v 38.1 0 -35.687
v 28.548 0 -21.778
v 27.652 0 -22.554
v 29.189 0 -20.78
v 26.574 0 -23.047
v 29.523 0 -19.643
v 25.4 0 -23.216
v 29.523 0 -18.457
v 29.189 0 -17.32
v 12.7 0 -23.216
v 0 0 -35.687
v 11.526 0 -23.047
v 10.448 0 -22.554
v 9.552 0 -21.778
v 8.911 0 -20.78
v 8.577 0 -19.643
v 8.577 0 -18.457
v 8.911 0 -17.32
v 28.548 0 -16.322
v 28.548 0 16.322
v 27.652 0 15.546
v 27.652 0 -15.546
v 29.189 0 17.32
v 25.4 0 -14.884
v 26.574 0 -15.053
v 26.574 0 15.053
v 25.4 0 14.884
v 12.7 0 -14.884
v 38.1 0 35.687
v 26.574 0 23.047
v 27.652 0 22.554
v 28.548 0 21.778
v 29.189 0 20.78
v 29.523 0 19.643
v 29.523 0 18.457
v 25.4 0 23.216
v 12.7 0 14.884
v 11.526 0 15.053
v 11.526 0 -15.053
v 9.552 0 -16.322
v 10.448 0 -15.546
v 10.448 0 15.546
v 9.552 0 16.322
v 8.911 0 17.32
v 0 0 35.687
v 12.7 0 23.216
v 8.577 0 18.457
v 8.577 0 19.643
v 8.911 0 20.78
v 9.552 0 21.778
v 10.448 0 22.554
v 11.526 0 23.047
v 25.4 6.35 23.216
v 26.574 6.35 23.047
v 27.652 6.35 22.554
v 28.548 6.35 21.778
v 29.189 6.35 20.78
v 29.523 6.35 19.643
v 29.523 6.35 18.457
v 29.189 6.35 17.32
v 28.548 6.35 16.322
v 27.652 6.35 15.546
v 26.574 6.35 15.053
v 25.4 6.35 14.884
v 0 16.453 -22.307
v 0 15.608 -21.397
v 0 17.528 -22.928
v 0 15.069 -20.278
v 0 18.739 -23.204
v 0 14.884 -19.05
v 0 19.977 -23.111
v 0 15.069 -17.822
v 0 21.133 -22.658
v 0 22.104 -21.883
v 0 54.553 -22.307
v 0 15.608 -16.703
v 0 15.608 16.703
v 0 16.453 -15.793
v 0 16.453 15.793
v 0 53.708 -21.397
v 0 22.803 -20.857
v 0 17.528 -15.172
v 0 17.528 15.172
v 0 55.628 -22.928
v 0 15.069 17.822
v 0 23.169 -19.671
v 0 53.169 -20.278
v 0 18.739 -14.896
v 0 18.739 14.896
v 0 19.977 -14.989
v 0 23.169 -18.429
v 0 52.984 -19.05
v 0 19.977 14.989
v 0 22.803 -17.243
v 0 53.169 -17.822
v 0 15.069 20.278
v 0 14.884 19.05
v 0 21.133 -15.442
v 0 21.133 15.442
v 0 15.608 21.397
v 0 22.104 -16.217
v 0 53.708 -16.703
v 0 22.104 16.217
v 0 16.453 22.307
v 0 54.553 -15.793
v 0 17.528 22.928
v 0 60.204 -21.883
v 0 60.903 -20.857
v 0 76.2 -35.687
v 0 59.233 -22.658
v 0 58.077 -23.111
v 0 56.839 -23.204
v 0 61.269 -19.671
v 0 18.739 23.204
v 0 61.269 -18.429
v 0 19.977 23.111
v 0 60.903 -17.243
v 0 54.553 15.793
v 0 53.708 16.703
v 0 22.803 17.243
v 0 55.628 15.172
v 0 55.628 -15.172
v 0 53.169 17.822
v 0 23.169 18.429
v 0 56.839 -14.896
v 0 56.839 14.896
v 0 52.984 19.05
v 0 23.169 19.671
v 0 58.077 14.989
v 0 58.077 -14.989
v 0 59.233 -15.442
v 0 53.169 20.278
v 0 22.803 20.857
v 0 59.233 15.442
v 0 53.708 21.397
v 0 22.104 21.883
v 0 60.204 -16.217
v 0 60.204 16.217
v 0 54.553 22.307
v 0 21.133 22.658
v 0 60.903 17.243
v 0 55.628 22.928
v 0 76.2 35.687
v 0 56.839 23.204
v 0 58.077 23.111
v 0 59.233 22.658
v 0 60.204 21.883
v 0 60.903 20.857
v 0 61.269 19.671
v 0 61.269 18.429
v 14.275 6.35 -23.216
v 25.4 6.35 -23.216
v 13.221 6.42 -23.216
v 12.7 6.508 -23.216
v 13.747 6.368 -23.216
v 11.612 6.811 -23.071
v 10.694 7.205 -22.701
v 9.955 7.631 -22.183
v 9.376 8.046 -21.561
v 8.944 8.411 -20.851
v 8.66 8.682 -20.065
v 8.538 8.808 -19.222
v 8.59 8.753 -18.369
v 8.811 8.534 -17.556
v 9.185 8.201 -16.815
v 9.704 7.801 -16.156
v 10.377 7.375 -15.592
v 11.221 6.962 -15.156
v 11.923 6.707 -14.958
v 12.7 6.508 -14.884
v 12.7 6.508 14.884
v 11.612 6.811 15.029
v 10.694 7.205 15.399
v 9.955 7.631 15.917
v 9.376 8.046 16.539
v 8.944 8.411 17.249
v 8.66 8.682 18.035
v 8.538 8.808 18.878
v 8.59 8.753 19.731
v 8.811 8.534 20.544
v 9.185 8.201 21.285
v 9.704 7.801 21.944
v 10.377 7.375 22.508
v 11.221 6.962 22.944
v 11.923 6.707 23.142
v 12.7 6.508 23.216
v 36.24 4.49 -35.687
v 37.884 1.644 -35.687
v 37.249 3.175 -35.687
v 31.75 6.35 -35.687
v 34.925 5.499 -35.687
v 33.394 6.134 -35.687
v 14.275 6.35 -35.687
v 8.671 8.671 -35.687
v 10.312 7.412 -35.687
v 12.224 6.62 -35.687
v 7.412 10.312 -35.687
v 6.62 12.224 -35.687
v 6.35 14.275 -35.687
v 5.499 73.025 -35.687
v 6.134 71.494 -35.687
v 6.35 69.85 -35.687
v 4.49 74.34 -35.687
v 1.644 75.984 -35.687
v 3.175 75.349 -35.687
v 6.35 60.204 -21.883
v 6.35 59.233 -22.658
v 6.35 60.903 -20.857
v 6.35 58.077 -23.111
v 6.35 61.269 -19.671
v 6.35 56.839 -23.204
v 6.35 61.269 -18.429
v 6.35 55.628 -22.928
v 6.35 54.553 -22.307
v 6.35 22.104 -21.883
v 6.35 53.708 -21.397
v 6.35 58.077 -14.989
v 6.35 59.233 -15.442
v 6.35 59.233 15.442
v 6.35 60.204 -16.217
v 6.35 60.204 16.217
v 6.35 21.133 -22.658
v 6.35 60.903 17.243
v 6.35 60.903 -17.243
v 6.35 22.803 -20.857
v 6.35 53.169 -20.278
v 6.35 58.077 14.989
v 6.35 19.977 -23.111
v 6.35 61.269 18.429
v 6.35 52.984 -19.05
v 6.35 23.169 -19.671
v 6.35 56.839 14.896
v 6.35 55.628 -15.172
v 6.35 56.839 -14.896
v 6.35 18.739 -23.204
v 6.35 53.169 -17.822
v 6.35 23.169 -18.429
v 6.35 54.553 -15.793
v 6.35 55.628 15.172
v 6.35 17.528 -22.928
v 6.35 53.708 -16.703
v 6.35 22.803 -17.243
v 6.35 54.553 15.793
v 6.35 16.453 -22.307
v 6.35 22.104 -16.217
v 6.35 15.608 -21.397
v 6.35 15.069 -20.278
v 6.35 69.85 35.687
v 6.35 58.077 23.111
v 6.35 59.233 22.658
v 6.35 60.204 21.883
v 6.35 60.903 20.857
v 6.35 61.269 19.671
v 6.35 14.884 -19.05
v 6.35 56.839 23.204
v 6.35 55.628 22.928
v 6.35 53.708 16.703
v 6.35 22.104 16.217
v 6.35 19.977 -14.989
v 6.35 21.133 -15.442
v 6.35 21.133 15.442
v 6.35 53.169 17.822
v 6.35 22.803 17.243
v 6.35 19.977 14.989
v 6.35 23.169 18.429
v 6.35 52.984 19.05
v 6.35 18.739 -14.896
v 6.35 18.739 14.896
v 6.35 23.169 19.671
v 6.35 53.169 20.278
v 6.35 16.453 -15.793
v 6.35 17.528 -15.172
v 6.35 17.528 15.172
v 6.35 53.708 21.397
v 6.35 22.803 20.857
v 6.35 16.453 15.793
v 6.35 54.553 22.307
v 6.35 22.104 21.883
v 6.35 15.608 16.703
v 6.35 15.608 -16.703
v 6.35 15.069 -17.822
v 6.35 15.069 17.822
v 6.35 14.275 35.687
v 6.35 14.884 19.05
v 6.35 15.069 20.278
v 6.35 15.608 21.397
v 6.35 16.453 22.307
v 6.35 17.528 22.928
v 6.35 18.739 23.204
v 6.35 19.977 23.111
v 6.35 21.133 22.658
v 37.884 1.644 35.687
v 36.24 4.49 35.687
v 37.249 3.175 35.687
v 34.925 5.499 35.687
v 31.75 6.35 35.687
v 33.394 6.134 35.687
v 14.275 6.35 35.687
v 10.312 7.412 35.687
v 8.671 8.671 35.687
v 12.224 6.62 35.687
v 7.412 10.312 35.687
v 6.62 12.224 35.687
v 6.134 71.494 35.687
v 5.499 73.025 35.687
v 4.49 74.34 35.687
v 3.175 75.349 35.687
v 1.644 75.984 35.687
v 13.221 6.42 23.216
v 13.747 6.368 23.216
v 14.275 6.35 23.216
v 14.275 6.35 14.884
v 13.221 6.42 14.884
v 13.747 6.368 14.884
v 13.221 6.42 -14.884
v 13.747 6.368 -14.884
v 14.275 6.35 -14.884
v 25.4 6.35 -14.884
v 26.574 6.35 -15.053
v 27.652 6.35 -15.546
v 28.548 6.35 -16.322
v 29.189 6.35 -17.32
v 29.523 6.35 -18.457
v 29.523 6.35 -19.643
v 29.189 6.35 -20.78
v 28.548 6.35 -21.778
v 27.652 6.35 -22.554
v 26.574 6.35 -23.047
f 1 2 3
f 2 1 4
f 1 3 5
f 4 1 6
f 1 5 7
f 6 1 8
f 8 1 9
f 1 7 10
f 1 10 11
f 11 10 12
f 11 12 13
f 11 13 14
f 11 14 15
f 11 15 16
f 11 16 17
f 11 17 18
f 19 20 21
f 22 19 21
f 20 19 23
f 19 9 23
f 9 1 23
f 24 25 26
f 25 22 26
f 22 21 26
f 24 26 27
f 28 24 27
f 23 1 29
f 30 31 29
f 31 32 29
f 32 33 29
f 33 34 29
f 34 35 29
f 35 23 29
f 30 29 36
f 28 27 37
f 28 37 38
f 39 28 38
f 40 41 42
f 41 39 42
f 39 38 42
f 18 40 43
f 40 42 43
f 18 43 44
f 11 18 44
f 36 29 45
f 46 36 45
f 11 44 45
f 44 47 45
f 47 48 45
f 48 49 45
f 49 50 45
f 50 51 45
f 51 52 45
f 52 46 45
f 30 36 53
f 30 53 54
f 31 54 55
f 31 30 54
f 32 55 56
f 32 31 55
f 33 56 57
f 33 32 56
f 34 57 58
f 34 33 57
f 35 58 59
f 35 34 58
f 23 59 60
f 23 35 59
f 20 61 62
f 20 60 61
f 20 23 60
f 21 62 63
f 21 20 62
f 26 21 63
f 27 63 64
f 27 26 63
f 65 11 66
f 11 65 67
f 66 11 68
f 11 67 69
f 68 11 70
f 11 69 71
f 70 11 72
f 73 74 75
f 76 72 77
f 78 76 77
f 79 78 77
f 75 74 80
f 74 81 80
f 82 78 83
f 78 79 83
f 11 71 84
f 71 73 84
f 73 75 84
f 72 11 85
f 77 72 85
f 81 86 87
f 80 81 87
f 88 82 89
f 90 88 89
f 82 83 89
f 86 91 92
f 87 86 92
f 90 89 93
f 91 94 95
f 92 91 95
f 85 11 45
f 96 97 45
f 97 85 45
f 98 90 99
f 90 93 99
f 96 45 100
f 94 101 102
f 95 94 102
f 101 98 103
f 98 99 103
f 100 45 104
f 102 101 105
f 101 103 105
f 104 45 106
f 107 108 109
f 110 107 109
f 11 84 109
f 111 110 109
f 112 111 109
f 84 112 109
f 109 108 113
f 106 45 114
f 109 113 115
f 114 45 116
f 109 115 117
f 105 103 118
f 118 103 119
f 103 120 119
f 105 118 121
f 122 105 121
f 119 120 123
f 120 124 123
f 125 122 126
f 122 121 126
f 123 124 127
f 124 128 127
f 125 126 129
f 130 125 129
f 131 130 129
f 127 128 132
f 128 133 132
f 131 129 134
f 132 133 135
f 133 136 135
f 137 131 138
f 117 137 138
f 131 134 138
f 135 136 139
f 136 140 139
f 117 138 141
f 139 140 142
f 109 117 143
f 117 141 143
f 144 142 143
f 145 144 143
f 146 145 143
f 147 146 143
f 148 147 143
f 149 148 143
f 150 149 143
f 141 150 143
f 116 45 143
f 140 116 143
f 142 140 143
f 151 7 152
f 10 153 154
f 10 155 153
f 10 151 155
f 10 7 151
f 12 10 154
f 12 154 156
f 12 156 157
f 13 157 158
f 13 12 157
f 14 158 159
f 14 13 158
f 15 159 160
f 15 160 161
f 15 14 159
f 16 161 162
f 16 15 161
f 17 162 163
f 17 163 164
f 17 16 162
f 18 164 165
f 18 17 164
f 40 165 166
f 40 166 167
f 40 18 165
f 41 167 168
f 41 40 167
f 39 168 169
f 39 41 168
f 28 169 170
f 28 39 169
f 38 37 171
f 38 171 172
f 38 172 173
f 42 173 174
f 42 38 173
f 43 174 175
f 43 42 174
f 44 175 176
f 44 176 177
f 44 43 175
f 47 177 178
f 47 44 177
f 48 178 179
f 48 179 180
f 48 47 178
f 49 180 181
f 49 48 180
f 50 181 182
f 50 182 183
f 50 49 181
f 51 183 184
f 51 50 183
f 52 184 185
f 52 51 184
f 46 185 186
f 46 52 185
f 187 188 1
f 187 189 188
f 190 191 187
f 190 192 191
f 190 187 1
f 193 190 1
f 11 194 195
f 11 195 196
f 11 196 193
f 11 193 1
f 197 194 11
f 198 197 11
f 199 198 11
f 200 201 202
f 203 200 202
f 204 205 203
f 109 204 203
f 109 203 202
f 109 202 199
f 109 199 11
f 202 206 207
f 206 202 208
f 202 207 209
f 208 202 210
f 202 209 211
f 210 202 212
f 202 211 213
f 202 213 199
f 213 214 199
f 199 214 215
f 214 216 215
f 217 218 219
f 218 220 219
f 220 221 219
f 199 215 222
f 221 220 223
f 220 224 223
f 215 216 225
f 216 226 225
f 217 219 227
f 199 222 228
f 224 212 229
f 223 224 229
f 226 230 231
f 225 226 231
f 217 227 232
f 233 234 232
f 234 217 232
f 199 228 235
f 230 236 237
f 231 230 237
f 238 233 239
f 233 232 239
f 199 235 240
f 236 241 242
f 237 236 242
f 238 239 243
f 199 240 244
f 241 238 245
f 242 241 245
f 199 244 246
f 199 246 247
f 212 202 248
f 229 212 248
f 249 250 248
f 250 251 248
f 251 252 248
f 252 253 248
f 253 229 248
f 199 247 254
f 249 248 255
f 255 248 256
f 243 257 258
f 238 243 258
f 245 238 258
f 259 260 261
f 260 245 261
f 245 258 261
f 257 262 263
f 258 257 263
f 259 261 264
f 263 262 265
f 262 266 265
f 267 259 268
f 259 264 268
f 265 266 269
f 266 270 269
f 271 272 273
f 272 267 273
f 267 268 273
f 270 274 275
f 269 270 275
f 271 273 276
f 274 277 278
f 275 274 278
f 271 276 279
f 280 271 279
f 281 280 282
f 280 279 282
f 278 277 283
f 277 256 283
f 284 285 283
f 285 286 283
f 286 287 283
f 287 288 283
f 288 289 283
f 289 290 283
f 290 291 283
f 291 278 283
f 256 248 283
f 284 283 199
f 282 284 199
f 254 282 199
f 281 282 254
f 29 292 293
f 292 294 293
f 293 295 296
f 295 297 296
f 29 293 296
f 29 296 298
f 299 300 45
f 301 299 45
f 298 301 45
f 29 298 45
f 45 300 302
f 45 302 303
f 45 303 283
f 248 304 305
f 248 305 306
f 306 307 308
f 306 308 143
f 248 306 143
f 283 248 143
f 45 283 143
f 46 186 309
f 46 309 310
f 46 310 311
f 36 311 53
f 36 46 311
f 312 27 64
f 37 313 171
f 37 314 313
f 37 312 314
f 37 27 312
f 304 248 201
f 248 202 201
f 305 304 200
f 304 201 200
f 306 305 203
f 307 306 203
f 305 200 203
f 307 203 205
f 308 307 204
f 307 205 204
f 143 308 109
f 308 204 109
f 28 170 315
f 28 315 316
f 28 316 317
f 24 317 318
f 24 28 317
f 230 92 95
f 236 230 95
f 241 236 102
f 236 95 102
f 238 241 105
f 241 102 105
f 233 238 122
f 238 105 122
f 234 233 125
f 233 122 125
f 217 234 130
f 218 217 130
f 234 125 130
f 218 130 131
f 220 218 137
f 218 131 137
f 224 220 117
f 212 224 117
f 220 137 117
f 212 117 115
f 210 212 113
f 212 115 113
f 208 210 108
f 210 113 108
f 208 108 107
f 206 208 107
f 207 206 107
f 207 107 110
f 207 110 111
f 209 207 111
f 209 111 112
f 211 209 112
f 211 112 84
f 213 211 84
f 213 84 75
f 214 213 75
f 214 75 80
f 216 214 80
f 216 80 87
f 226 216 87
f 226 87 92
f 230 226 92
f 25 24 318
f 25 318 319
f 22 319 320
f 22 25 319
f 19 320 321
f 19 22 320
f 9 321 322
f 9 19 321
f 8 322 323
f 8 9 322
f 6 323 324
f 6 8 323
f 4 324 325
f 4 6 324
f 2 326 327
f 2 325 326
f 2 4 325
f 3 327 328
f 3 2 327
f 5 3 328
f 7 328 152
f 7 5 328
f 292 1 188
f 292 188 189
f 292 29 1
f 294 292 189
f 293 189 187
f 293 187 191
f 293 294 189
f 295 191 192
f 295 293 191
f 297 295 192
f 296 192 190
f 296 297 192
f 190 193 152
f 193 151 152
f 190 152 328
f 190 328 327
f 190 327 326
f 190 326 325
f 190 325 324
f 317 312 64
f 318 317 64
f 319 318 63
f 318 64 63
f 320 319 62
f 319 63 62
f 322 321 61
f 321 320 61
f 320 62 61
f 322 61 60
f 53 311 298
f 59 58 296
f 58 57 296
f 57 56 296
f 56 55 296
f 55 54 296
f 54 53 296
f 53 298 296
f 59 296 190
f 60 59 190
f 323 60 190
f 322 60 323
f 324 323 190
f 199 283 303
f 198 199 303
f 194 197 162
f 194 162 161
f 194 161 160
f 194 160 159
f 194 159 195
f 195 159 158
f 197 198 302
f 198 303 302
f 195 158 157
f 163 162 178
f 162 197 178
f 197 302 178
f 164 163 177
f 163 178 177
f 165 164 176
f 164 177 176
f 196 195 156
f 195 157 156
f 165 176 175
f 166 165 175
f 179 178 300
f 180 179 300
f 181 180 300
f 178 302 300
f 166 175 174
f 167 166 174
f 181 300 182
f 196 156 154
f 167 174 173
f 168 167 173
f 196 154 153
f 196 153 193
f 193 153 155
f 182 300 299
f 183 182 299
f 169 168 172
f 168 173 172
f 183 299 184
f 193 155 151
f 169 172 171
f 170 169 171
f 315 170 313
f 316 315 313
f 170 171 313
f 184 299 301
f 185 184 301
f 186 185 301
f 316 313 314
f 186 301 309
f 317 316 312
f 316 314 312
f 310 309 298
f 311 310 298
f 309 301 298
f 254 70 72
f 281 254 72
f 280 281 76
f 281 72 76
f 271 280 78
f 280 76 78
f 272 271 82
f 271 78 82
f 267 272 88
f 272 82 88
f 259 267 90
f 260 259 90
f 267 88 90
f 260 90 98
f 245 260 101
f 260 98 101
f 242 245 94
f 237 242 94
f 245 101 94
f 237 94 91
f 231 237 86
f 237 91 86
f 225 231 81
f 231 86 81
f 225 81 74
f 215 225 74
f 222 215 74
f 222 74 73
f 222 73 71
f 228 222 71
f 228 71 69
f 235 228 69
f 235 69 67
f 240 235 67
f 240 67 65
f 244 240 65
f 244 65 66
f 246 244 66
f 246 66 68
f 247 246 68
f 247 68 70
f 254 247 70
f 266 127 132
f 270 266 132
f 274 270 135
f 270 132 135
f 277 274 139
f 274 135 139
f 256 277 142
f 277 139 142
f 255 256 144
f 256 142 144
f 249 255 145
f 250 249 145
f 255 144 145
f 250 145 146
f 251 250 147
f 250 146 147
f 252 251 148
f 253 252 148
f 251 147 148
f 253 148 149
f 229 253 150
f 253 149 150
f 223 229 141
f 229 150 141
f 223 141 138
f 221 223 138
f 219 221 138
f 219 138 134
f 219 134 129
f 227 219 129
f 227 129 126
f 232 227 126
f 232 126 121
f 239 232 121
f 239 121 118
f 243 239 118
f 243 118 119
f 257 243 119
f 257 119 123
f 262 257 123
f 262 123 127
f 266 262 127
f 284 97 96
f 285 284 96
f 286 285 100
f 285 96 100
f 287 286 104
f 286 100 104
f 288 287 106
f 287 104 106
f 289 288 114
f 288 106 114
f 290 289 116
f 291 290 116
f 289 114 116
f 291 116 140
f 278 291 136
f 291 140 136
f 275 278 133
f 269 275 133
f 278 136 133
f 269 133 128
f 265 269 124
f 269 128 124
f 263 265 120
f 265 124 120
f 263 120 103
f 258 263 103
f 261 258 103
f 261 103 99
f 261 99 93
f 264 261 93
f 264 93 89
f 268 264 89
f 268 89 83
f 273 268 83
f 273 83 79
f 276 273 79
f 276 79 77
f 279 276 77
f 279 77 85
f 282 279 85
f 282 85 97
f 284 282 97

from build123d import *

# Parameters (mm, degrees)
BOSS_EXTRUDE1_DEPTH = 35.687
FILLET1_R           = 6.35
CUT_EXTRUDE1_REACH  = 94.367
SKETCH4_R           = 4.1656
CUT_EXTRUDE2_DEPTH  = 93.366725481


with BuildPart() as part:
    # Sketch2 → Boss-Extrude1 (new, symmetric)
    with BuildSketch(Plane.XY):
        with BuildLine():
            Line((0, 0), (0, 76.2))
            Line((0, 76.2), (6.35, 76.2))
            Line((6.35, 76.2), (6.35, 14.2748))
            ThreePointArc((6.35, 14.2748), (8.67112018, 8.67112018), (14.2748, 6.35))
            Line((14.2748, 6.35), (38.1, 6.35))
            Line((38.1, 6.35), (38.1, 0))
            Line((38.1, 0), (0, 0))
        make_face()
    extrude(amount=BOSS_EXTRUDE1_DEPTH, both=True)

    # Fillet1
    fillet1_edges = [part.edges().sort_by_distance(p)[0] for p in [
        (38.1, 6.35, 0),
        (6.35, 76.2, 0),
    ]]
    fillet(fillet1_edges, radius=FILLET1_R - 0.0001)  # a hair under: the kernel refuses the full size

    # Sketch3 → Cut-Extrude1 (cut, up to next)
    with BuildSketch(Plane.XZ, mode=Mode.PRIVATE) as cut_extrude1_sk1:
        with BuildLine():
            Line((25.4, 14.8844), (12.7, 14.8844))
            ThreePointArc((12.7, 14.8844), (8.5344, 19.05), (12.7, 23.2156))
            Line((12.7, 23.2156), (25.4, 23.2156))
            ThreePointArc((25.4, 23.2156), (29.5656, 19.05), (25.4, 14.8844))
        make_face()
    cut_extrude1_tool1 = extrude(cut_extrude1_sk1.sketch, amount=-CUT_EXTRUDE1_REACH, mode=Mode.PRIVATE) & part.part
    # Sketch3 → Cut-Extrude1 (cut, up to next)
    with BuildSketch(Plane.XZ, mode=Mode.PRIVATE) as cut_extrude1_sk2:
        with BuildLine():
            Line((25.4, -23.2156), (12.7, -23.2156))
            ThreePointArc((12.7, -23.2156), (8.5344, -19.05), (12.7, -14.8844))
            Line((12.7, -14.8844), (25.4, -14.8844))
            ThreePointArc((25.4, -14.8844), (29.5656, -19.05), (25.4, -23.2156))
        make_face()
    cut_extrude1_tool2 = extrude(cut_extrude1_sk2.sketch, amount=-CUT_EXTRUDE1_REACH, mode=Mode.PRIVATE) & part.part
    add(cut_extrude1_tool1.solids().sort_by_distance((19.05, 0, 19.05))[0], mode=Mode.SUBTRACT)
    add(cut_extrude1_tool2.solids().sort_by_distance((19.05, 0, -19.05))[0], mode=Mode.SUBTRACT)

    # Sketch4 → Cut-Extrude2 (cut, through all)
    with BuildSketch(Plane.ZY):
        with Locations(Location((19.05, 57.15, 0), (0, 0, 270))):
            Circle(SKETCH4_R)
        with Locations(Location((-19.05, 19.05, 0), (0, 0, 270))):
            Circle(SKETCH4_R)
        with Locations(Location((-19.05, 57.15, 0), (0, 0, 270))):
            Circle(SKETCH4_R)
        with Locations(Location((19.05, 19.05, 0), (0, 0, 270))):
            Circle(SKETCH4_R)
    extrude(amount=-CUT_EXTRUDE2_DEPTH, mode=Mode.SUBTRACT)


solid = part.part
